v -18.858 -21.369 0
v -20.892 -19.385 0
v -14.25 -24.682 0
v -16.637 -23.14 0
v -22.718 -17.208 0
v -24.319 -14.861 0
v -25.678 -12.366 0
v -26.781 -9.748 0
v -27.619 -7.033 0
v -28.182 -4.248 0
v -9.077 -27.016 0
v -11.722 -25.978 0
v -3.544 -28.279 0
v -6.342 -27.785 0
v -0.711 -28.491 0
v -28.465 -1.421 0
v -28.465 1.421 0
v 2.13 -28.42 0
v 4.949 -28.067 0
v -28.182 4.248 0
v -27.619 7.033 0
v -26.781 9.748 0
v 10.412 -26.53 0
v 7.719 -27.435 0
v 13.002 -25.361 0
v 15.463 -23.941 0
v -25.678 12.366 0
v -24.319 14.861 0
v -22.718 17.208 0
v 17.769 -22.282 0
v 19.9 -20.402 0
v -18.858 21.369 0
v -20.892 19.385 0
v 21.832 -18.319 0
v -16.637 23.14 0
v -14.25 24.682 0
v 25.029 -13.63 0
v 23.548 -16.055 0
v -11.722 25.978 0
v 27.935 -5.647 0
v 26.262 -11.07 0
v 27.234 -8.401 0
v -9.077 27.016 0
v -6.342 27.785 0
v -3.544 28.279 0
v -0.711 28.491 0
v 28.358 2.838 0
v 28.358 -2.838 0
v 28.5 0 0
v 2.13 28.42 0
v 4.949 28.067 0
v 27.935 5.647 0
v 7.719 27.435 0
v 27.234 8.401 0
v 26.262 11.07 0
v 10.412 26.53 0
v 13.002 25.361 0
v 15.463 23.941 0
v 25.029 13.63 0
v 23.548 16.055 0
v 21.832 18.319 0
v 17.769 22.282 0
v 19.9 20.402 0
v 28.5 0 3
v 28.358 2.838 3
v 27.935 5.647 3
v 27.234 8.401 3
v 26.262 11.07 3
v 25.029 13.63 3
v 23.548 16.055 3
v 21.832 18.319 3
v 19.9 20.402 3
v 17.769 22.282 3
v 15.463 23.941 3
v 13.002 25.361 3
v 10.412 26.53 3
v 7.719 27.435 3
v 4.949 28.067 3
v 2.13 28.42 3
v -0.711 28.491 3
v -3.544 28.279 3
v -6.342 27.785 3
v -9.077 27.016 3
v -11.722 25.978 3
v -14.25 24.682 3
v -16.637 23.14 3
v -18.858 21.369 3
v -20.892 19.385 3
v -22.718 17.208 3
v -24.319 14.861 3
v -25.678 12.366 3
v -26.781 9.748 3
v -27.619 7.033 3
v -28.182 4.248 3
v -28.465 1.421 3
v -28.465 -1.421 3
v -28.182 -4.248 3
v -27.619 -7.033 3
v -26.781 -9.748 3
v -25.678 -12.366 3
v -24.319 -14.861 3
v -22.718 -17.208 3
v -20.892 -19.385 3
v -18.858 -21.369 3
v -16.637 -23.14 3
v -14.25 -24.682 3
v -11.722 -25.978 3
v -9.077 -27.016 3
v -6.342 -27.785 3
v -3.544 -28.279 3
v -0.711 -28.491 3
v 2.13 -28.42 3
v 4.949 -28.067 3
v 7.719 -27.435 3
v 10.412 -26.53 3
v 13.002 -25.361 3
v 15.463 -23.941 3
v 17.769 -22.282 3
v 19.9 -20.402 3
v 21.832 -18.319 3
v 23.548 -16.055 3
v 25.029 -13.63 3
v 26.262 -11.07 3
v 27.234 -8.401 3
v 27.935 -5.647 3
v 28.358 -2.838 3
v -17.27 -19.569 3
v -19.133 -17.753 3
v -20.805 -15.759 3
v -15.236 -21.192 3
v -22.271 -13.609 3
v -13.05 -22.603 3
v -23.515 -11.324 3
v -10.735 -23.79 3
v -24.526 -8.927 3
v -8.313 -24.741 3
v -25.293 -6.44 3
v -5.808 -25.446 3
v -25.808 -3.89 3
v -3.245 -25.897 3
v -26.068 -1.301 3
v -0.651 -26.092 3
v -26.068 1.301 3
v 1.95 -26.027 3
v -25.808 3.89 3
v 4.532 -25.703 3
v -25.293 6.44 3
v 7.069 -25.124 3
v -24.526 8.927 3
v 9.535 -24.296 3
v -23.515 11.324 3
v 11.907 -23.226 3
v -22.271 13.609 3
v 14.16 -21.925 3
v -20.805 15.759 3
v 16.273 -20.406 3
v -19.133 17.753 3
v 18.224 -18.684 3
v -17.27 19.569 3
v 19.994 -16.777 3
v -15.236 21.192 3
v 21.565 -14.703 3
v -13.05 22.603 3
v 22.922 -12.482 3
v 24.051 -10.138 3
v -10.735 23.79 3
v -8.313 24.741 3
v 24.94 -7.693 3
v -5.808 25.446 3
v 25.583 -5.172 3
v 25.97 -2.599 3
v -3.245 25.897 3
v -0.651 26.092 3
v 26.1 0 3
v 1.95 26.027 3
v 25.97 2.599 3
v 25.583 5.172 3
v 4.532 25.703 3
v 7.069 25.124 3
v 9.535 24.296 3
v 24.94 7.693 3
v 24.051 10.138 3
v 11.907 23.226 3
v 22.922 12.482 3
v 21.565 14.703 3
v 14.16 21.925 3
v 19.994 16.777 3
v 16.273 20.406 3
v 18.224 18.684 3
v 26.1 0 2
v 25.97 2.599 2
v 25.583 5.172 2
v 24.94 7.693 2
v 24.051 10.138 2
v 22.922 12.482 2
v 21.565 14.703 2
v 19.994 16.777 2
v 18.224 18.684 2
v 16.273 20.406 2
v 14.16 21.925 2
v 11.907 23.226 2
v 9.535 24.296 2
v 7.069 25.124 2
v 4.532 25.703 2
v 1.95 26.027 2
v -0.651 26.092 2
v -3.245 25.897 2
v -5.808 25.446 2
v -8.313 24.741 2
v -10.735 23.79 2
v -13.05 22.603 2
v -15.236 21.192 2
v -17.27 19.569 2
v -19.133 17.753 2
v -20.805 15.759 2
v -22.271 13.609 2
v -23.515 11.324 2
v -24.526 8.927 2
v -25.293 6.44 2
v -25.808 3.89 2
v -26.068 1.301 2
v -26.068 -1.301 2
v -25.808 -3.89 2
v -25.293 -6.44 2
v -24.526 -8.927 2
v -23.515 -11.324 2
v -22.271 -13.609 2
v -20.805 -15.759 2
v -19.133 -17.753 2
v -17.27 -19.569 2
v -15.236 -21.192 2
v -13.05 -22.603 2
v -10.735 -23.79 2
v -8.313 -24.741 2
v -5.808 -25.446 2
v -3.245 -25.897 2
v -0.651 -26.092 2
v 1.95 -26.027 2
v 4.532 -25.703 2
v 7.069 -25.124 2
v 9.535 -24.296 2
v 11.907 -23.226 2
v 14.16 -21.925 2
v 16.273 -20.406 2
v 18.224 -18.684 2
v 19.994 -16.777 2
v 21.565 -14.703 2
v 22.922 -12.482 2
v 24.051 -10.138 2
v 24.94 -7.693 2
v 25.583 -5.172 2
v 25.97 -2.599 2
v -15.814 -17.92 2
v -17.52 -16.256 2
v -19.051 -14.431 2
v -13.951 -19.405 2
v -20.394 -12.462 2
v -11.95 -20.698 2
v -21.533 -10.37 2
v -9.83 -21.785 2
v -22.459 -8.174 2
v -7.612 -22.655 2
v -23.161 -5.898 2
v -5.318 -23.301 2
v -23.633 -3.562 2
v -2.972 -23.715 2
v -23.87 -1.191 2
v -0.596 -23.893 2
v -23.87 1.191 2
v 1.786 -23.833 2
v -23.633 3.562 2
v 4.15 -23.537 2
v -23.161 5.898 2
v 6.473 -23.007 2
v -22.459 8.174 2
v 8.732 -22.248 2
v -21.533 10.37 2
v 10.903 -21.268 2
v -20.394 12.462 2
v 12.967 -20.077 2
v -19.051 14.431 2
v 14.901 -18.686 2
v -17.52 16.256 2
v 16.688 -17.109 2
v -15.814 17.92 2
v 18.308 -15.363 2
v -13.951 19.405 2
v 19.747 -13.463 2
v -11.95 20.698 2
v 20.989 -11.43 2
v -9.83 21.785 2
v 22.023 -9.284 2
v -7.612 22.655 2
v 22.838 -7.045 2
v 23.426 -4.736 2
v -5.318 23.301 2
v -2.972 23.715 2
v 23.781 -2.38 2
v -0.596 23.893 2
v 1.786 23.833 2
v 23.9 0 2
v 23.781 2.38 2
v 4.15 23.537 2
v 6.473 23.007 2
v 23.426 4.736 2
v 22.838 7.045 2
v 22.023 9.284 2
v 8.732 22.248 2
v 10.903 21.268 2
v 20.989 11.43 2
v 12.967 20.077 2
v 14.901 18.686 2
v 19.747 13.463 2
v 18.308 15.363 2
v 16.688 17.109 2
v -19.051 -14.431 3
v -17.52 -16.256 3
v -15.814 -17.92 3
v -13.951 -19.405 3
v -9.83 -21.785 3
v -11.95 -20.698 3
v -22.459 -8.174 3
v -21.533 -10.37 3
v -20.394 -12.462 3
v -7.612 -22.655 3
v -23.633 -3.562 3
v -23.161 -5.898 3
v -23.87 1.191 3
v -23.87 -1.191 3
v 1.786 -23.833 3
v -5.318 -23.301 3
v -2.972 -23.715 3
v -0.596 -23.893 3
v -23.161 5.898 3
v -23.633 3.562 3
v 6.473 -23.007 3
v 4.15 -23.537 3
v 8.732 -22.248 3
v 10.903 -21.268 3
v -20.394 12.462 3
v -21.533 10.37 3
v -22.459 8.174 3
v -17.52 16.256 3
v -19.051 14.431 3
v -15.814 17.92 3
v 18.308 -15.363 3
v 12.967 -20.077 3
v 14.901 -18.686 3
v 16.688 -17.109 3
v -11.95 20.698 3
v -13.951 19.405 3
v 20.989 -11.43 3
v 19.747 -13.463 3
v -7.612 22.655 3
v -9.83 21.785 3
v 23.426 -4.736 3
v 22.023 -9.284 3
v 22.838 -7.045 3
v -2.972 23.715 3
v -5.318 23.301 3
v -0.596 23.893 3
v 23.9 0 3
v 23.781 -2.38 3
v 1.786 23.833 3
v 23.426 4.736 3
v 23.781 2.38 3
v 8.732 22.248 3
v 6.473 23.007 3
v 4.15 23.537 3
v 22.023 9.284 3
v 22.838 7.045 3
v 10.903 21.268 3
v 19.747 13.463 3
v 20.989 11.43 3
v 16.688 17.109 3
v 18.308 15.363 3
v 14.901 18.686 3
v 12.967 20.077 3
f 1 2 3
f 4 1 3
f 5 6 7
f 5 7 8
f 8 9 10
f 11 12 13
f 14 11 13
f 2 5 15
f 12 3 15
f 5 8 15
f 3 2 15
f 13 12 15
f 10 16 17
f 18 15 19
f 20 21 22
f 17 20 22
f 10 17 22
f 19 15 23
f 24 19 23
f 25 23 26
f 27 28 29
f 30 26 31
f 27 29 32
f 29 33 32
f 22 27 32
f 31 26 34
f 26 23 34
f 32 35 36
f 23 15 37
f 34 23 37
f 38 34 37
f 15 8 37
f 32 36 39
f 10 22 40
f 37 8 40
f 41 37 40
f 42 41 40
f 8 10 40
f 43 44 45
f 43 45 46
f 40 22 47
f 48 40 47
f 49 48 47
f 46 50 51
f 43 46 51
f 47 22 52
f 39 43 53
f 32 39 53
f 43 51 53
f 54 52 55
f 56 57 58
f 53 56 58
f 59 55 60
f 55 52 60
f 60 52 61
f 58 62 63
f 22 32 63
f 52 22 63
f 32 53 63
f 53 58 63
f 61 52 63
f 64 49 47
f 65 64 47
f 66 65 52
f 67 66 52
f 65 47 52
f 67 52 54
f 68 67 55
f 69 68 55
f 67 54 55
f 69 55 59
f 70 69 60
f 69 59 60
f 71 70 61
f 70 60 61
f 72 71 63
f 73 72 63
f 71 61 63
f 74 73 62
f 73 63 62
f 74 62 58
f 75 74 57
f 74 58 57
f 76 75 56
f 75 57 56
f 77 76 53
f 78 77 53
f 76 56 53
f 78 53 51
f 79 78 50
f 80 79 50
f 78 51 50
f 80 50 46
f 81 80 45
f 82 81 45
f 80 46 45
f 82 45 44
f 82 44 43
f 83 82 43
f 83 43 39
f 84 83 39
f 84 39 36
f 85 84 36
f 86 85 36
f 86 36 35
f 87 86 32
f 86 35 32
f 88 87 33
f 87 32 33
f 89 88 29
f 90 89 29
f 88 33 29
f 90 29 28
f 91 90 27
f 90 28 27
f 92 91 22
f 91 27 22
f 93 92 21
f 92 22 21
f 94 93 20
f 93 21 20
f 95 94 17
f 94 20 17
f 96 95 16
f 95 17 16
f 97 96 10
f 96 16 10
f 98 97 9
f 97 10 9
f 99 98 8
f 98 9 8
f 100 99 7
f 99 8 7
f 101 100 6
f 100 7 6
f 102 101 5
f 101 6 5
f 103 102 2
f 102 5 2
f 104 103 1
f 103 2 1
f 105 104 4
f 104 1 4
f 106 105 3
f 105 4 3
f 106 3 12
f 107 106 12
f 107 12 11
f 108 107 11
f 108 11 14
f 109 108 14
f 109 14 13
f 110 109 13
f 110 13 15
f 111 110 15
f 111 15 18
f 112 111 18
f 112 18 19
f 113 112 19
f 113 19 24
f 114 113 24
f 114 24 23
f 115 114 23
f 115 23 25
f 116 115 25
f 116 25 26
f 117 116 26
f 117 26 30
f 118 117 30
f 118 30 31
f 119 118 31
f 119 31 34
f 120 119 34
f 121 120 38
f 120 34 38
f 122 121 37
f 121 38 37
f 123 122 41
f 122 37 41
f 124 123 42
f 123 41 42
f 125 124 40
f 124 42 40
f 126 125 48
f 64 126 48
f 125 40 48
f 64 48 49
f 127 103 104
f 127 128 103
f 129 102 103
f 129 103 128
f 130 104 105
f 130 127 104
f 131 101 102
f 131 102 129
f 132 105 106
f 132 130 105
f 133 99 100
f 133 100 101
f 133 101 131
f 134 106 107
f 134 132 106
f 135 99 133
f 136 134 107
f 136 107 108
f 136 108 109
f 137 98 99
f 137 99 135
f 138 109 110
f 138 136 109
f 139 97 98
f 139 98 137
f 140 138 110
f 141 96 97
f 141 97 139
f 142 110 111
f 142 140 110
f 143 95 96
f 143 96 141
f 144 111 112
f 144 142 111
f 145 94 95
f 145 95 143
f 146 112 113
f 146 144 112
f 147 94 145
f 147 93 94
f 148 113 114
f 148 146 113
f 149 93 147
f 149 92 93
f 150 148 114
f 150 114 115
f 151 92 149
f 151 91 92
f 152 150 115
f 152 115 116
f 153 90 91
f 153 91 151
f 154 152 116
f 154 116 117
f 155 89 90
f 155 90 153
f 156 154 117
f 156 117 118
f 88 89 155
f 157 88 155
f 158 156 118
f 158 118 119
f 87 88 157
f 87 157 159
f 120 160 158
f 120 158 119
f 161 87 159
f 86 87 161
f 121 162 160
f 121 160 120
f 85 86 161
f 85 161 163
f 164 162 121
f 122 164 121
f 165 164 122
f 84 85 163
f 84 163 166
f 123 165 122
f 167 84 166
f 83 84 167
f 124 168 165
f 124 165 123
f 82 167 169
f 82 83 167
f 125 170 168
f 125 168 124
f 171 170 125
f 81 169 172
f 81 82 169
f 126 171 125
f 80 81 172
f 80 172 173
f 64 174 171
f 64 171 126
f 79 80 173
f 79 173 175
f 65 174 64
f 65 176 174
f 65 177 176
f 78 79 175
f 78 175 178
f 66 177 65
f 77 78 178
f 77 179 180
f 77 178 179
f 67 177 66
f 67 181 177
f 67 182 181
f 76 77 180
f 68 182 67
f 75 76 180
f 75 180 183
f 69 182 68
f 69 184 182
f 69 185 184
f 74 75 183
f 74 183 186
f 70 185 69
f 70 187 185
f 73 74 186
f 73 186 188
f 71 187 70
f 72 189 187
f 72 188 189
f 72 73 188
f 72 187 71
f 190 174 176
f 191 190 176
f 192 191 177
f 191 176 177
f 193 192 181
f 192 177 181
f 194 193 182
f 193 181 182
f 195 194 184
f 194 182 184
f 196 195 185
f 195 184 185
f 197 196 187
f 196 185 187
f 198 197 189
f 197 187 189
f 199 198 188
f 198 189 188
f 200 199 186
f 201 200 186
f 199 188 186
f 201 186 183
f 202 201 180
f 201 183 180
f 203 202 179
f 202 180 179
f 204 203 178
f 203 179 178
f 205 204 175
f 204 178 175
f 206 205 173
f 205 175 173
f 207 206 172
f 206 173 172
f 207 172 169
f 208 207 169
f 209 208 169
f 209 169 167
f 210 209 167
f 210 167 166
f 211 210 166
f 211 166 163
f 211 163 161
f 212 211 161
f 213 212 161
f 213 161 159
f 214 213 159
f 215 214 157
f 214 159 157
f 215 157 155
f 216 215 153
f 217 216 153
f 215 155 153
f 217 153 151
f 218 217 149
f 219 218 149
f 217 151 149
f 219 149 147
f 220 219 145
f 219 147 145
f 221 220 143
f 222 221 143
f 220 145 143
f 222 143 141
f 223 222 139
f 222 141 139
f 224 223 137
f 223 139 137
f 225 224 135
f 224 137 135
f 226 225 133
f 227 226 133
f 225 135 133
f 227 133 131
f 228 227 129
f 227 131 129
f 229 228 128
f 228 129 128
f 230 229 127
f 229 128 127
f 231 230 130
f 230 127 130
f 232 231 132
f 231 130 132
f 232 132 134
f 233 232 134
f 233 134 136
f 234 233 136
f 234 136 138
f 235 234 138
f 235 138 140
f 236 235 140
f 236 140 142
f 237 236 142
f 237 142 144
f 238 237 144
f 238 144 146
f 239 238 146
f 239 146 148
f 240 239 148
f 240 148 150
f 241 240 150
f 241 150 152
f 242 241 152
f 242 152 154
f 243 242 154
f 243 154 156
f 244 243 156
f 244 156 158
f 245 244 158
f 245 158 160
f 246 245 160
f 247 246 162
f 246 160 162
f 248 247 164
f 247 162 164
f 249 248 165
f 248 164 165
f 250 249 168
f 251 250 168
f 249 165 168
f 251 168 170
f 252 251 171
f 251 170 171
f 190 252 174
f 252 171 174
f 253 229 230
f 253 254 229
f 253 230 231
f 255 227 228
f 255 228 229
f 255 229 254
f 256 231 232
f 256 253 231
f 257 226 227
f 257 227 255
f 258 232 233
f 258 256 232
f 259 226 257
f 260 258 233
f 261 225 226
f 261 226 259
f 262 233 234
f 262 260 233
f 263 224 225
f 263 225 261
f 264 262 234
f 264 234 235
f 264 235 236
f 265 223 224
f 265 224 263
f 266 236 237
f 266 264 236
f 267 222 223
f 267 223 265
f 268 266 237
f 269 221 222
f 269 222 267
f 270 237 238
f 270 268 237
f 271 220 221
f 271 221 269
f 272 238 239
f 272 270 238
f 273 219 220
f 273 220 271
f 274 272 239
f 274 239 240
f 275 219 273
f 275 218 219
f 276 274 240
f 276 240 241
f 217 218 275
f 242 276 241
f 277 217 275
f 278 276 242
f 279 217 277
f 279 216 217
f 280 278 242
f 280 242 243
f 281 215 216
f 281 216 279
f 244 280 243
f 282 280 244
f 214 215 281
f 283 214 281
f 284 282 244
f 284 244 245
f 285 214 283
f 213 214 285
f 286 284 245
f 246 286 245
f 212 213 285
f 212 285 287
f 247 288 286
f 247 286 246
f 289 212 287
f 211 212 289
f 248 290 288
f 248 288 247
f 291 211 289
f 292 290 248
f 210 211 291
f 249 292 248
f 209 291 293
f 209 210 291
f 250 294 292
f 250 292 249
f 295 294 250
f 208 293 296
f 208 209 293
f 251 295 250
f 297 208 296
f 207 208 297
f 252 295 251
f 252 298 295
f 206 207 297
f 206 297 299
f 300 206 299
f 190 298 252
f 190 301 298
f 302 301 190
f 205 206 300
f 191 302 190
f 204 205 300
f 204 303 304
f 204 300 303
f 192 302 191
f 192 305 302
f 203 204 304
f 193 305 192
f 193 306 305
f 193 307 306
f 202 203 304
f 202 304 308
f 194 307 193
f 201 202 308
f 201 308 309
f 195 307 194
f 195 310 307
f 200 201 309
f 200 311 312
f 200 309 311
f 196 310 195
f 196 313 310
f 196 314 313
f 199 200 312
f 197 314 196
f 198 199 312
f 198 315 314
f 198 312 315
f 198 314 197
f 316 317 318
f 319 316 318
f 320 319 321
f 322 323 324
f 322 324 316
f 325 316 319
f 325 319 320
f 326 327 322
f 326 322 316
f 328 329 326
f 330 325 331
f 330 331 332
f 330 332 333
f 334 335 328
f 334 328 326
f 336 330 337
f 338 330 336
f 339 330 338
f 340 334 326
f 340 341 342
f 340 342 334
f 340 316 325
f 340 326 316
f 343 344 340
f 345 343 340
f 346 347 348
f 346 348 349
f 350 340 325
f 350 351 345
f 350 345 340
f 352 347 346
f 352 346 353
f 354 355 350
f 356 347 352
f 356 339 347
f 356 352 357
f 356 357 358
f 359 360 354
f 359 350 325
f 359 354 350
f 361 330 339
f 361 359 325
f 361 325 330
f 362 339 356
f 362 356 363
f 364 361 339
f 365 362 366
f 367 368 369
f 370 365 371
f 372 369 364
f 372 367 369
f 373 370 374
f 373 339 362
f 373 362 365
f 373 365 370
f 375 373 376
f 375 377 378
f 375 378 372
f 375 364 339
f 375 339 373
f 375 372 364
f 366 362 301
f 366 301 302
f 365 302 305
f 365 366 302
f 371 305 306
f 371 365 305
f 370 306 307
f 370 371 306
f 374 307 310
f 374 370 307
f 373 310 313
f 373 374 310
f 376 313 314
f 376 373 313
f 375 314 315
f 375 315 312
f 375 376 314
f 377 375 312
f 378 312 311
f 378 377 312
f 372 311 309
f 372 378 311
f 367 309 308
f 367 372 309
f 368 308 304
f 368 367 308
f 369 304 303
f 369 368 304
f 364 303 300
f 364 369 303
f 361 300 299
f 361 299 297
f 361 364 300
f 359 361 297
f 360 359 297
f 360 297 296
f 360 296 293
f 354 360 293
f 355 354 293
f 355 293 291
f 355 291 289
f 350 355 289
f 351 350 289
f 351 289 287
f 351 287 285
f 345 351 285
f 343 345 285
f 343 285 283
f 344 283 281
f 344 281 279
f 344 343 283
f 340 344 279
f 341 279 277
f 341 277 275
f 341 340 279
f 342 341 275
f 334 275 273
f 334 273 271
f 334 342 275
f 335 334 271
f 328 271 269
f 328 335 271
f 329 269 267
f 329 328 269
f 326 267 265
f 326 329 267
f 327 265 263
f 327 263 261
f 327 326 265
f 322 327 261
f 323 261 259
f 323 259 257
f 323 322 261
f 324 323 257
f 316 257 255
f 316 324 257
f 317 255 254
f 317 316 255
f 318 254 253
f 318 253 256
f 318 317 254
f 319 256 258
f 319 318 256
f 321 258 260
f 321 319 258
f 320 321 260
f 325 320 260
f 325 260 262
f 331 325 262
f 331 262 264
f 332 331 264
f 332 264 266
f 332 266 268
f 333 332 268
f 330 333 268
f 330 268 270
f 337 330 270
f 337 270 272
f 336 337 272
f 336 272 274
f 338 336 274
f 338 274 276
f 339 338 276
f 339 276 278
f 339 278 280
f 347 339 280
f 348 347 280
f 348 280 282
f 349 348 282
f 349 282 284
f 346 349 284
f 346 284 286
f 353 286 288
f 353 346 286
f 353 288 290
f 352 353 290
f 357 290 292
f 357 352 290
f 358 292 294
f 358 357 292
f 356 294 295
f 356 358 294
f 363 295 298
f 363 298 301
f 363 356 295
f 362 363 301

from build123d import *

# Parameters (mm, degrees)
F0_R     = 28.5
F1_DEPTH = 3
F2_R     = 26.1
F2_R_2   = 23.9
F3_DEPTH = 1


with BuildPart() as f1:
    # F0 (on Top) → F1 (new body)
    with BuildSketch(Plane.XY):
        Circle(F0_R)
    extrude(amount=F1_DEPTH)

    # F2 (on face) → F3 (cut)
    with BuildSketch(Plane.XY.offset(3)):
        Circle(F2_R)
        Circle(F2_R_2, mode=Mode.SUBTRACT)
    extrude(amount=-F3_DEPTH, mode=Mode.SUBTRACT)


solid = f1.part
